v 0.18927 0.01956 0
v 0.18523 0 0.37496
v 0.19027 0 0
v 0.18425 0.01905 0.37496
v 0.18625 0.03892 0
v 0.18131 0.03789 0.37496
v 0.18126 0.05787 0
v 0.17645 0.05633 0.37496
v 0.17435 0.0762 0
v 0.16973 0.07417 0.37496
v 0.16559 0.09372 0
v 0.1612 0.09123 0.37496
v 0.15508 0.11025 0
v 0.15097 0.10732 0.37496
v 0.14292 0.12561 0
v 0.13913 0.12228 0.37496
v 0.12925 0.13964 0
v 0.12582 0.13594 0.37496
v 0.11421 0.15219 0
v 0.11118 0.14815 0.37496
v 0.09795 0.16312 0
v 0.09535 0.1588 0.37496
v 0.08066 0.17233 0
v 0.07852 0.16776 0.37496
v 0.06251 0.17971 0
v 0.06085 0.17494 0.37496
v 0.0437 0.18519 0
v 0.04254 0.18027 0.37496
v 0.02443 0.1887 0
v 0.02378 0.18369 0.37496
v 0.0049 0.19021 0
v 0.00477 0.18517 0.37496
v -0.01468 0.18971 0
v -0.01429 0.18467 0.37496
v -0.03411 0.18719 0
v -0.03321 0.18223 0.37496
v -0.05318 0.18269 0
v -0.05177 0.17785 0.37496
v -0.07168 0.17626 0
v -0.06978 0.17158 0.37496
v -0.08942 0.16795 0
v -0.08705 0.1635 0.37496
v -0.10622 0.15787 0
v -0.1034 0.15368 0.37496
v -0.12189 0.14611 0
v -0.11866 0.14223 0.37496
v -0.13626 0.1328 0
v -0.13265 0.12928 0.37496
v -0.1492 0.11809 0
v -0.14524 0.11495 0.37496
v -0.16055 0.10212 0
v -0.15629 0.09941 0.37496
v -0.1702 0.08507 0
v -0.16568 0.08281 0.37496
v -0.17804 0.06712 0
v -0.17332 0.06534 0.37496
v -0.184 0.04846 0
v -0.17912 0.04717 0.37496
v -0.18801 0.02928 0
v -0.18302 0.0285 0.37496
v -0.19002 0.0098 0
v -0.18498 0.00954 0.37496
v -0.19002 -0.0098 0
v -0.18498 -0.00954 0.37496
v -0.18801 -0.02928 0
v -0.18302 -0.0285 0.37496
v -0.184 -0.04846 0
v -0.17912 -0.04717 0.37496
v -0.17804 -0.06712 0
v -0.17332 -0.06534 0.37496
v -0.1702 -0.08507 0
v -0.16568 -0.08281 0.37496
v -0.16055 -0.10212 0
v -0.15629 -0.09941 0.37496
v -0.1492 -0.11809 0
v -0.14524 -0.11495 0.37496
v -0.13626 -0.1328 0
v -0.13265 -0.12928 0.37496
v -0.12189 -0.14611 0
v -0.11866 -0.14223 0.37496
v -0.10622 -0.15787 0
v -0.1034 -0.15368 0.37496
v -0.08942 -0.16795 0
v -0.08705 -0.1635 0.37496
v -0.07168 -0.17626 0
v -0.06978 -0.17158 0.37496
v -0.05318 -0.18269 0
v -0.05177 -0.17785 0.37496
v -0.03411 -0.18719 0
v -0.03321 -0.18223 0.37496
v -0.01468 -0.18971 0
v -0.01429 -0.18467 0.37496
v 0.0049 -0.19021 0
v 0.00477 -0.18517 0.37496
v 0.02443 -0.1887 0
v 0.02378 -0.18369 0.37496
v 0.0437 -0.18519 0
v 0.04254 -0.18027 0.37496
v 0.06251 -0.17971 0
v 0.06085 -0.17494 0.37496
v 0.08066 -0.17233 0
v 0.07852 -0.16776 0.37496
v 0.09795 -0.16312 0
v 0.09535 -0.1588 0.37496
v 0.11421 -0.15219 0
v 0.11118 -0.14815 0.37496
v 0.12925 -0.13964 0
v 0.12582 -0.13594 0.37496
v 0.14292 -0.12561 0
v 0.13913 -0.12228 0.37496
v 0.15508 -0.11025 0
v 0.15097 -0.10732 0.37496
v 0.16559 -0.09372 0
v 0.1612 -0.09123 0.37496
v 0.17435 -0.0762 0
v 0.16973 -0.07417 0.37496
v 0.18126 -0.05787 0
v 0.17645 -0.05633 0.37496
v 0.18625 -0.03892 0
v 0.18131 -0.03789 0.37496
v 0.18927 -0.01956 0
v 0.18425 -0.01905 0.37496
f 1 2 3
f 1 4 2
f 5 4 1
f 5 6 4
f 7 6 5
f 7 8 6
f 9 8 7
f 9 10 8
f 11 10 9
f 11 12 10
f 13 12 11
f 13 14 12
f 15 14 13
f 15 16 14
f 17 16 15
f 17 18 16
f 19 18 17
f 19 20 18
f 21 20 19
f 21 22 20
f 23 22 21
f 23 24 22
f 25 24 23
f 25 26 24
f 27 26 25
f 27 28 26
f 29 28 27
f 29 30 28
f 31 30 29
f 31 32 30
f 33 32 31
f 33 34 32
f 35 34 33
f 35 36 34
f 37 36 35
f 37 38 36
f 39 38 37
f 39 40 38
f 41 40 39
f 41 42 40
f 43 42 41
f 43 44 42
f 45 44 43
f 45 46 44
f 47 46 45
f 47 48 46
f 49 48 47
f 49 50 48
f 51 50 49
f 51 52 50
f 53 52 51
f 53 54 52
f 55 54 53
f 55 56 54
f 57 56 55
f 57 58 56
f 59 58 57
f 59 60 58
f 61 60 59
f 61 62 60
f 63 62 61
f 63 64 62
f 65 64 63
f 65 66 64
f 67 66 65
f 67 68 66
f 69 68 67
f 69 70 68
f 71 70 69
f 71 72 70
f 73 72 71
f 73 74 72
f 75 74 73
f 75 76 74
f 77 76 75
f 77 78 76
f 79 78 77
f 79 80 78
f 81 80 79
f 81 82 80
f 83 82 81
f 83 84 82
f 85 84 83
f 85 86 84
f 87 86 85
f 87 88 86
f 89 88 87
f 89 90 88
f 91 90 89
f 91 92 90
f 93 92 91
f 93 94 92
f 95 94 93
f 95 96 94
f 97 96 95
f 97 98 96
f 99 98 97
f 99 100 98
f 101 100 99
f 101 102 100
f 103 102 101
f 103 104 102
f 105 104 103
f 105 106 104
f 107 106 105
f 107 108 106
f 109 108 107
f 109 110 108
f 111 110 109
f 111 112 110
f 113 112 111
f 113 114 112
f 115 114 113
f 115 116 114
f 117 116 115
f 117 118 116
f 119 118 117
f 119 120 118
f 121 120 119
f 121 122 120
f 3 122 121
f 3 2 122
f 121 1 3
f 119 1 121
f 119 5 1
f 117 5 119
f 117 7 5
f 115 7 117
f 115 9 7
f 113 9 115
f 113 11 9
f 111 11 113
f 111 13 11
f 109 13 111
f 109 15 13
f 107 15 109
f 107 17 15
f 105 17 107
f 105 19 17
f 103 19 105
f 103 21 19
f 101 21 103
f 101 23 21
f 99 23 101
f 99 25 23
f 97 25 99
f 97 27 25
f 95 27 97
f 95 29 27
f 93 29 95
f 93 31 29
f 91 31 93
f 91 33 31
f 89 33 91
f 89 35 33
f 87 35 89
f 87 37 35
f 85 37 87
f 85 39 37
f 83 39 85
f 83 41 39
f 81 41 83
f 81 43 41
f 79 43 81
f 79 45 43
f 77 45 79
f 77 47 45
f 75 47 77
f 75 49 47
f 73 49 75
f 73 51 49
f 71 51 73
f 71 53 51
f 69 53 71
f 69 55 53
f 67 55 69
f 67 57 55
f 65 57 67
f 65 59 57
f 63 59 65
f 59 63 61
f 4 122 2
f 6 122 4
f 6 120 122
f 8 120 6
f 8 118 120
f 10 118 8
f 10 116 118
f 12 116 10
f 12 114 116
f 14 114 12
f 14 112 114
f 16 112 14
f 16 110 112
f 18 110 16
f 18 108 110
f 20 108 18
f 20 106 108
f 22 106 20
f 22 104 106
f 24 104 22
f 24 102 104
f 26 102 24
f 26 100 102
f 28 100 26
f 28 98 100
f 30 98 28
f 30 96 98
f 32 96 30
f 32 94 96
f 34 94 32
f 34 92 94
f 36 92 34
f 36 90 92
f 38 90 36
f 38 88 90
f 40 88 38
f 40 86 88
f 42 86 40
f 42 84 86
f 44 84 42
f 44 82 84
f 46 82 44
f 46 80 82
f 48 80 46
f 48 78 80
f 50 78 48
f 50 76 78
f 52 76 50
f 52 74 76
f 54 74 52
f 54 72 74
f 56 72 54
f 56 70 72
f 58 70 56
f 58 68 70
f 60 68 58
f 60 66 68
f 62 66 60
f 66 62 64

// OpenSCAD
// file: ../Meta/Units.scad
Millimeters = 1;
Inches = 2;

DEFAULT_UNITS = Inches;

function Units() = DEFAULT_UNITS;
function UnitsFs() = Units() == Millimeters ? 2 : 2/25.4;

function InchesToMillimeters(n) = n * 25.4;
function MillimetersToInches(n) = n / 25.4;

function Millimeters(n, units=Units())   = units == Millimeters   ? n : MillimetersToInches(n);
function Inches(n, units=Units()) = units == Inches ? n : InchesToMillimeters(n);
function UnitSelect(value, units) = units == Millimeters ? Millimeters(value) : Inches(value);
function UnitType(type) = type == "Millimeters" ? Millimeters : Inches;

module ScaleToMillimeters() {
  if (Units() == Inches) {
    scale(25.4)
    children();
  } else {
    children();
  }
}
// file: ../Meta/slookup.scad
// Lookup a value from a string-indexed table
function slookup(string, table) = table[search([string], table)[0]][1];
// file: ../Meta/Resolution.scad
// Constants
RESOLUTION_LOW = 0;
RESOLUTION_HIGH = 1;

// Setting
RESOLUTION = RESOLUTION_HIGH;

// Utility functions
function ResolutionIsLow() = RESOLUTION == RESOLUTION_LOW;
function ResolutionIsHigh() = RESOLUTION == RESOLUTION_HIGH;
function Resolution(low, high) = ResolutionIsLow() ? low : high;
function ResolutionFs() = Resolution(1, 0.25);
function ResolutionFa() = Resolution(10, 4);
// main file
use <../Meta/Resolution.scad>;
use <../Meta/slookup.scad>;
use <../Meta/Units.scad>;

/* [Taper Preview] */
_NPT_SIZE = "1/8"; // ["1/16", "1/8", "1/4", "3/8", "1/2", "3/4", "1", "1 1/4", "1 1/2", "2"]
_NPT_L1 = 0;

// *********
// * Setup *
// *********
$fa = ResolutionFa();
$fs = UnitsFs()*ResolutionFs();

// ****************
// * NPT Formulae *
// ****************

//NPT's effective thread length
function taperNPT_L2(outsideDiameter, tpi) = (0.8*outsideDiameter + 6.8)*(1/tpi);

//NPT's Pitch diameter at end of pipe
function taperNPT_E0(outsideDiameter, tpi) =
	outsideDiameter - (0.05*outsideDiameter + 1.1)*(1/tpi);

//NPT's Pitch diameter at large end of internal thread
function taperNPT_E1(E0, L1) = E0 + 0.0625*L1;

module taperNPT(specName, L1 = 0) {
	spec = NPT_Spec(specName);
	assert(spec != undef, concat("Could not find NPT spec: ", specName));
	
	outsideDiameter = NPT_OD(spec);
	tpi = NPT_ThreadsPerInch(spec);
	L1 = NPT_L1(spec);
	
	taperNPT_(outsideDiameter, tpi, L1, L3 = 3/tpi);
}

module taperNPT_(outsideDiameter, tpi, L1 = 0, L3 = 0) {
	if(L1 == 0 && L3 == 0)
	cylinder(taperNPT_L2(outsideDiameter, tpi),
	         taperNPT_E1(taperNPT_E0(outsideDiameter, tpi), taperNPT_L2(outsideDiameter, tpi))/2,
	         taperNPT_E0(outsideDiameter, tpi)/2);
	else if(L3 == 0)
	cylinder(taperNPT_L2(outsideDiameter, tpi),
	         taperNPT_E1(taperNPT_E0(outsideDiameter, tpi), L1)/2,
	         taperNPT_E0(outsideDiameter, tpi)/2);
	else
	cylinder(taperNPT_L2(outsideDiameter, tpi) + L3,
	         taperNPT_E1(taperNPT_E0(outsideDiameter, tpi), L1 + L3)/2,
	         taperNPT_E1(taperNPT_E0(outsideDiameter, tpi), L3)/2);
}

// Size Name: [Nominal Size (decimal), Threads Per Inch, OD, L1]
NPT_SPECS = [
	["1/16", [1/16, 27, 0.3125, 0.160]],
	["1/8", [1/8, 27, 0.405, 0.1615]],
	["1/4", [1/4, 18, 0.540, 0.2278]],
	["3/8", [3/8, 18, 0.675, 0.240]],
	["1/2", [1/2, 14, 0.840, 0.320]],
	["3/4", [3/4, 14, 1.050, 0.339]],
	["1", [1, 11.5, 1.315, 0.400]],
	["1 1/4", [1+(1/4), 11.5, 1.660, 0.420]],
	["1 1/2", [1+(1/2), 11.5, 1.900, 0.420]], //I _triple_ checked, it _is_ the same L1 as 1 1/4
	["2", [2, 11.5, 2.375, 0.436]]
];

function NPT_Spec(sizeString) = slookup(sizeString, NPT_SPECS);
function NPT_NominalSize(spec) = spec[0];
function NPT_ThreadsPerInch(spec) = spec[1];
function NPT_OD(spec) = spec[2]; //This applies to more than just NPT
function NPT_L1(spec) = spec[3];

taperNPT(_NPT_SIZE, _NPT_L1);
